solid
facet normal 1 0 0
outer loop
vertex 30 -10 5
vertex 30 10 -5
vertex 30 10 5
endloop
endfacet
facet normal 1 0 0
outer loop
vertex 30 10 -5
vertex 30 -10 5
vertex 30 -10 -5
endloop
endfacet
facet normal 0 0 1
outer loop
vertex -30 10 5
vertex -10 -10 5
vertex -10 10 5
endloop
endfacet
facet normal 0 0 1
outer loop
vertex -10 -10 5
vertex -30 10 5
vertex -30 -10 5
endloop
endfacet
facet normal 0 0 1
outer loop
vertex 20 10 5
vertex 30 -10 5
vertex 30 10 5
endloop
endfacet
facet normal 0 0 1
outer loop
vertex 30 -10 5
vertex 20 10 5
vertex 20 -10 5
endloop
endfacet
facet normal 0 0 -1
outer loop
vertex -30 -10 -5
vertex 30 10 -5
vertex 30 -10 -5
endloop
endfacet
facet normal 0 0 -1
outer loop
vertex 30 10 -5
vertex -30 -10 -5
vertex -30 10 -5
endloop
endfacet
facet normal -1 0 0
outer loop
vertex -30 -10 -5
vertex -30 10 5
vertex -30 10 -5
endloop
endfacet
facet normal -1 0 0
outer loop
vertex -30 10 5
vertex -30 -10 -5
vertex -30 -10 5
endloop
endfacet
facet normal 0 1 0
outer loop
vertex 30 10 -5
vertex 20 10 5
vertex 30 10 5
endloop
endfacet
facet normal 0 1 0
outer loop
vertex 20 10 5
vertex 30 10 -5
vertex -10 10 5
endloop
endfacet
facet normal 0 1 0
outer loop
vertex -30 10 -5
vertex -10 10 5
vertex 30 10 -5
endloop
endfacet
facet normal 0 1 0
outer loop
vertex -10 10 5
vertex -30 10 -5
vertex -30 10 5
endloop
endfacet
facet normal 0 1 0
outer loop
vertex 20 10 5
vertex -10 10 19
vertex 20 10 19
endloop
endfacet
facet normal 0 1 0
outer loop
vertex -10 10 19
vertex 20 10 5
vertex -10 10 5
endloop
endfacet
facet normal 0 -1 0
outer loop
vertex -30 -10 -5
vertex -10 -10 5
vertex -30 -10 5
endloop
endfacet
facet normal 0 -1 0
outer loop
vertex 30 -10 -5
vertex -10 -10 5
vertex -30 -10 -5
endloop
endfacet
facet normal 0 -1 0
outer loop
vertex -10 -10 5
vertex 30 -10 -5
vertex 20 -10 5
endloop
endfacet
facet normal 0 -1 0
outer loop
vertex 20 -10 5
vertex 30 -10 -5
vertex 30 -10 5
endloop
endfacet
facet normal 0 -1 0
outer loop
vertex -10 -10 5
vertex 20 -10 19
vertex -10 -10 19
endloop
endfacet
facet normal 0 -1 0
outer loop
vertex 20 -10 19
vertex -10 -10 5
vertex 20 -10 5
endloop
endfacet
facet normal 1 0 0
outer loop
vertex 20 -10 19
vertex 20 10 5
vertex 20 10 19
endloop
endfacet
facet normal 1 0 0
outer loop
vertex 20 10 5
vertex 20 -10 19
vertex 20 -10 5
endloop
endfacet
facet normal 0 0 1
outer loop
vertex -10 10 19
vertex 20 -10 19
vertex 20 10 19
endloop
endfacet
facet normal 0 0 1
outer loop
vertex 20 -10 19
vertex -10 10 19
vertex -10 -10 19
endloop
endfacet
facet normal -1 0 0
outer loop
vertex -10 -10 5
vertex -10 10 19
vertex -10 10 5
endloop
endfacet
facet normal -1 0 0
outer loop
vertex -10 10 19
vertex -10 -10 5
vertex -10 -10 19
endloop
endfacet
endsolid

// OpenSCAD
module body(base_height=10, top_height=14, base_length=60, top_length=30, width=20, top_offset=5) {
    // Car body base 
    cube([base_length,width,base_height],center=true); 
    // Car body top 
    translate([top_offset,0,base_height/2+top_height/2])
    cube([top_length,width,top_height],center=true);
}
$fa = 1;
$fs = 0.4;
body();
